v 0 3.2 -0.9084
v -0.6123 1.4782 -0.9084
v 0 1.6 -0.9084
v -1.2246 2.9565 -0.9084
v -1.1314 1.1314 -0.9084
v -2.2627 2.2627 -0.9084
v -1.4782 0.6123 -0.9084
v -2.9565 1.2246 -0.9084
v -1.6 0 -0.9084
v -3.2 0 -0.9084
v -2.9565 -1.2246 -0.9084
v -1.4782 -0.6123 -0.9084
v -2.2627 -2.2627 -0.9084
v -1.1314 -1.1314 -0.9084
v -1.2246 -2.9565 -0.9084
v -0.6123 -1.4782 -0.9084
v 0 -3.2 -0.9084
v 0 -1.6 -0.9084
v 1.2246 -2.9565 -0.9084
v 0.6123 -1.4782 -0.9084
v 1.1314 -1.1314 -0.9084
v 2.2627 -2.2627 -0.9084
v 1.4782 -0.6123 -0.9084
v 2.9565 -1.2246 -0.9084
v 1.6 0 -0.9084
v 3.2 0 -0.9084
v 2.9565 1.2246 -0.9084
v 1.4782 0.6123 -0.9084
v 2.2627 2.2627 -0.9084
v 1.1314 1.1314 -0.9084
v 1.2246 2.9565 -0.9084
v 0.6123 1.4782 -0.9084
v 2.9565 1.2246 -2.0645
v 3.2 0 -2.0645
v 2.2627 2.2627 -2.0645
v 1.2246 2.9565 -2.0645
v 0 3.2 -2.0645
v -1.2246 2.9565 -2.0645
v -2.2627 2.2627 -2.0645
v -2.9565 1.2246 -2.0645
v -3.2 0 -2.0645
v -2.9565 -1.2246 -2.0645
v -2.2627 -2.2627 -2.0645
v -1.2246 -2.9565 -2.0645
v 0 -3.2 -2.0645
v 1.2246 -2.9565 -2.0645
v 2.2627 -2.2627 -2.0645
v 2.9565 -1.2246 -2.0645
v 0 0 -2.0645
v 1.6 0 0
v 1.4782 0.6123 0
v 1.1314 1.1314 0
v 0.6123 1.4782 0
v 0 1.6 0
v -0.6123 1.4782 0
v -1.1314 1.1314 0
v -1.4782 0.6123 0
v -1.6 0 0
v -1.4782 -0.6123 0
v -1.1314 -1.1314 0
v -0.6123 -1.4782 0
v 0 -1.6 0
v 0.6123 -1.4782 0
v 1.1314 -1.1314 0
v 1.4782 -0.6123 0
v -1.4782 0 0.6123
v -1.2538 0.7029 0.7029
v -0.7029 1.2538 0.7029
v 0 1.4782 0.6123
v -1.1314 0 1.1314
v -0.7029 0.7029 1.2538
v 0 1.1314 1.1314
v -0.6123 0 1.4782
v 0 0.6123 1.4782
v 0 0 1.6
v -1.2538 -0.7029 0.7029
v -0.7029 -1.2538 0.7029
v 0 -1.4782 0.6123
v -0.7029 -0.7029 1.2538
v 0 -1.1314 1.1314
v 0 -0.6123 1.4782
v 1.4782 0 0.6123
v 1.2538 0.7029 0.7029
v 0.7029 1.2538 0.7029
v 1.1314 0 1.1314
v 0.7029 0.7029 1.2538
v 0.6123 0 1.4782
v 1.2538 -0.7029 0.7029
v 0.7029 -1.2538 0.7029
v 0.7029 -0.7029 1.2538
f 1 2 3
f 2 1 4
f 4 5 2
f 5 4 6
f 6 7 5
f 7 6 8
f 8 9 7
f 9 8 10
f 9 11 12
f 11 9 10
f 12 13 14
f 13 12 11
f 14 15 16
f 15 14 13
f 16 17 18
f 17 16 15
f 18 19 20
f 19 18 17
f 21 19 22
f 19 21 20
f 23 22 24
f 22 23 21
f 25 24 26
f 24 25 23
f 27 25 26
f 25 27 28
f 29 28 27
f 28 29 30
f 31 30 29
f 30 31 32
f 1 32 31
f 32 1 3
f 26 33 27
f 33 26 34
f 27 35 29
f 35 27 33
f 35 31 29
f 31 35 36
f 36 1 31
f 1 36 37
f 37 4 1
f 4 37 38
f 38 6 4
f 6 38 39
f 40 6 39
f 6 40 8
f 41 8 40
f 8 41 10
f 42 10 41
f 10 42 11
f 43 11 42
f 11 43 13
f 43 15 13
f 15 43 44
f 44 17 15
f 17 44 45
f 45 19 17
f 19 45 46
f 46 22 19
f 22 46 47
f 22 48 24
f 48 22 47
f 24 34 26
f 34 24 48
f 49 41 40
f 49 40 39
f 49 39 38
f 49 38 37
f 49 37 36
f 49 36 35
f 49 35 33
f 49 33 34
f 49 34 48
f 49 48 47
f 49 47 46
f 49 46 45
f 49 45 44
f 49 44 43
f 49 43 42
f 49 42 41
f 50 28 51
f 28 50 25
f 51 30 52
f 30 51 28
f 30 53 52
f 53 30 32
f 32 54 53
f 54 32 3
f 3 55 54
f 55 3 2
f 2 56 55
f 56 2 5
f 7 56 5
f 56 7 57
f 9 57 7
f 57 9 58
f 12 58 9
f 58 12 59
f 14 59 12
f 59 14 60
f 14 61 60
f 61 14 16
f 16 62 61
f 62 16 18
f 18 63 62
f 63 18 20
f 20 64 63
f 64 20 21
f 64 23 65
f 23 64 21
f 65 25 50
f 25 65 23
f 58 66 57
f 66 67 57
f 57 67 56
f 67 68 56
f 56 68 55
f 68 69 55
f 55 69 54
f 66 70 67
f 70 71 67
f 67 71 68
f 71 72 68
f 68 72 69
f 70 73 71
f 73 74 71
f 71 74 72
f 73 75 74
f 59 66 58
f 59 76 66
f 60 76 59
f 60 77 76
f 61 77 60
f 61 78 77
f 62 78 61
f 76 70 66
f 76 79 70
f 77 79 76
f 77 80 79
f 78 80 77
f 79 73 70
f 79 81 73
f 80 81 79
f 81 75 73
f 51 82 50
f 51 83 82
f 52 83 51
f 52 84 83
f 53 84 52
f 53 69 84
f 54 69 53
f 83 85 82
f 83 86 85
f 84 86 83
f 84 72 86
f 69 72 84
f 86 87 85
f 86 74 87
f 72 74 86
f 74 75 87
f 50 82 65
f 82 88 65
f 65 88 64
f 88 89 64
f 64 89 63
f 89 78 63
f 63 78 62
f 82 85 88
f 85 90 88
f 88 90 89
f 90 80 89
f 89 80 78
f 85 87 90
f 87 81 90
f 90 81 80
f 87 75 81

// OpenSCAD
// file: ../p/stud3.scad
use <../lib.scad>
use <4-4cyli.scad>
use <4-4disc.scad>
use <4-4edge.scad>
$fa=1; $fs=0.2;
function ldraw_lib__stud3(realsolid=false) = realsolid ? 
    [openscad(translate([0,0,-eps()], o=cylinder(4+eps(), r=4)),2)] : [
// 0 Stud Tube Solid
// 0 Name: stud3.dat
// 0 Author: James Jessiman
// 0 !LDRAW_ORG Primitive UPDATE 2012-01
// 0 !LICENSE Licensed under CC BY 2.0 and CC BY 4.0 : see CAreadme.txt
// 
// 0 BFC CERTIFY CCW
  [0,"BFC","CERTIFY"],
  [0,"BFC","CCW"],
// 
// 0 !HISTORY 2002-04-04 [sbliss] Modified for BFC compliance
// 0 !HISTORY 2002-04-25 [PTadmin] Official Update 2002-02
// 0 !HISTORY 2007-06-24 [PTadmin] Header formatted for Contributor Agreement
// 0 !HISTORY 2008-07-01 [PTadmin] Official Update 2008-01
// 0 !HISTORY 2012-02-16 [Philo] Changed to CCW
// 0 !HISTORY 2012-03-30 [PTadmin] Official Update 2012-01
// 
// 
// 1 16 0 -4 0 4 0 0 0 1 0 0 0 4 4-4edge.dat
  [1,16,0,-4,0,4,0,0,0,1,0,0,0,4, ldraw_lib__4_4edge(realsolid)],
// 1 16 0 0 0 4 0 0 0 1 0 0 0 4 4-4edge.dat
  [1,16,0,0,0,4,0,0,0,1,0,0,0,4, ldraw_lib__4_4edge(realsolid)],
// 1 16 0 -4 0 4 0 0 0 1 0 0 0 4 4-4disc.dat
  [1,16,0,-4,0,4,0,0,0,1,0,0,0,4, ldraw_lib__4_4disc(realsolid)],
// 1 16 0 -4 0 4 0 0 0 4 0 0 0 4 4-4cyli.dat
  [1,16,0,-4,0,4,0,0,0,4,0,0,0,4, ldraw_lib__4_4cyli(realsolid)],
];
module ldraw_lib__stud3(step=0, col=false, unit=2/5, alt=false, line=0.2, solid=!$preview)
    makepoly(ldraw_lib__stud3(solid), step=step, col=col, unit=unit, alt=alt, line=line, solid=solid);
ldraw_lib__stud3(line=0.2);
// file: ../p/stud.scad
use <../lib.scad>
use <4-4cyli.scad>
use <4-4disc.scad>
use <4-4edge.scad>
$fa=1; $fs=0.2;
function ldraw_lib__stud(realsolid=false) = realsolid ? 
    [openscad(translate([0,0,-eps()], o=cylinder(4+eps(), r=6)),2)] : [
// 0 Stud
// 0 Name: stud.dat
// 0 Author: James Jessiman
// 0 !LDRAW_ORG Primitive UPDATE 2012-01
// 0 !LICENSE Licensed under CC BY 2.0 and CC BY 4.0 : see CAreadme.txt
// 
// 0 BFC CERTIFY CCW
  [0,"BFC","CERTIFY"],
  [0,"BFC","CCW"],
// 
// 0 !HISTORY 2002-04-04 [sbliss] Modified for BFC compliance
// 0 !HISTORY 2002-04-25 [PTadmin] Official Update 2002-02
// 0 !HISTORY 2007-06-24 [PTadmin] Header formatted for Contributor Agreement
// 0 !HISTORY 2008-07-01 [PTadmin] Official Update 2008-01
// 0 !HISTORY 2012-02-16 [Philo] Changed to CCW
// 0 !HISTORY 2012-03-30 [PTadmin] Official Update 2012-01
// 
// 
// 1 16 0 0 0 6 0 0 0 1 0 0 0 6 4-4edge.dat
  [1,16,0,0,0,6,0,0,0,1,0,0,0,6, ldraw_lib__4_4edge(realsolid)],
// 1 16 0 -4 0 6 0 0 0 1 0 0 0 6 4-4edge.dat
  [1,16,0,-4,0,6,0,0,0,1,0,0,0,6, ldraw_lib__4_4edge(realsolid)],
// 1 16 0 0 0 6 0 0 0 -4 0 0 0 6 4-4cyli.dat
  [1,16,0,0,0,6,0,0,0,-4,0,0,0,6, ldraw_lib__4_4cyli(realsolid)],
// 1 16 0 -4 0 6 0 0 0 1 0 0 0 6 4-4disc.dat
  [1,16,0,-4,0,6,0,0,0,1,0,0,0,6, ldraw_lib__4_4disc(realsolid)],
];
module ldraw_lib__stud(step=0, col=false, unit=2/5, alt=false, line=0.2, solid=!$preview)
    makepoly(ldraw_lib__stud(solid), step=step, col=col, unit=unit, alt=alt, line=line, solid=solid);
ldraw_lib__stud(line=0.2);
// file: ../p/box5.scad
use <../lib.scad>
$fa=1; $fs=0.2;
function ldraw_lib__box5(realsolid=false) = [
// 0 Box with 5 Faces and All Edges
// 0 Name: box5.dat
// 0 Author: James Jessiman
// 0 !LDRAW_ORG Primitive UPDATE 2012-01
// 0 !LICENSE Licensed under CC BY 2.0 and CC BY 4.0 : see CAreadme.txt
// 
// 0 BFC CERTIFY CCW
  [0,"BFC","CERTIFY"],
  [0,"BFC","CCW"],
// 
// 0 !HISTORY 2002-04-03 [sbliss] Modified for BFC compliance
// 0 !HISTORY 2002-04-25 [PTadmin] Official Update 2002-02
// 0 !HISTORY 2007-06-24 [PTadmin] Header formatted for Contributor Agreement
// 0 !HISTORY 2008-07-01 [PTadmin] Official Update 2008-01
// 0 !HISTORY 2012-02-16 [Philo] Changed to CCW
// 0 !HISTORY 2012-03-30 [PTadmin] Official Update 2012-01
// 
// 
// 2 24 1 1 1 -1 1 1
  [2,24,1,1,1,-1,1,1],
// 2 24 -1 1 1 -1 1 -1
  [2,24,-1,1,1,-1,1,-1],
// 2 24 -1 1 -1 1 1 -1
  [2,24,-1,1,-1,1,1,-1],
// 2 24 1 1 -1 1 1 1
  [2,24,1,1,-1,1,1,1],
// 2 24 1 0 1 -1 0 1
  [2,24,1,0,1,-1,0,1],
// 2 24 -1 0 1 -1 0 -1
  [2,24,-1,0,1,-1,0,-1],
// 2 24 -1 0 -1 1 0 -1
  [2,24,-1,0,-1,1,0,-1],
// 2 24 1 0 -1 1 0 1
  [2,24,1,0,-1,1,0,1],
// 2 24 1 0 1 1 1 1
  [2,24,1,0,1,1,1,1],
// 2 24 -1 0 1 -1 1 1
  [2,24,-1,0,1,-1,1,1],
// 2 24 1 0 -1 1 1 -1
  [2,24,1,0,-1,1,1,-1],
// 2 24 -1 0 -1 -1 1 -1
  [2,24,-1,0,-1,-1,1,-1],
// 4 16 -1 1 1 1 1 1 1 1 -1 -1 1 -1
  [4,16,-1,1,1,1,1,1,1,1,-1,-1,1,-1],
// 4 16 -1 1 1 -1 0 1 1 0 1 1 1 1
  [4,16,-1,1,1,-1,0,1,1,0,1,1,1,1],
// 4 16 -1 1 -1 -1 0 -1 -1 0 1 -1 1 1
  [4,16,-1,1,-1,-1,0,-1,-1,0,1,-1,1,1],
// 4 16 1 1 -1 1 0 -1 -1 0 -1 -1 1 -1
  [4,16,1,1,-1,1,0,-1,-1,0,-1,-1,1,-1],
// 4 16 1 1 1 1 0 1 1 0 -1 1 1 -1
  [4,16,1,1,1,1,0,1,1,0,-1,1,1,-1],
];
module ldraw_lib__box5(step=0, col=false, unit=2/5, alt=false, line=0.2, solid=!$preview)
    makepoly(ldraw_lib__box5(solid), step=step, col=col, unit=unit, alt=alt, line=line, solid=solid);
ldraw_lib__box5(line=0.2);
// file: ../p/box4t.scad
use <../lib.scad>
$fa=1; $fs=0.2;
function ldraw_lib__box4t(realsolid=false) = [
// 0 Box with 4 Adjacent Faces and All Edges
// 0 Name: box4t.dat
// 0 Author: Tore Eriksson [Tore_Eriksson]
// 0 !LDRAW_ORG Primitive UPDATE 2003-02
// 0 !LICENSE Licensed under CC BY 2.0 and CC BY 4.0 : see CAreadme.txt
// 
// 0 BFC CERTIFY CCW
  [0,"BFC","CERTIFY"],
  [0,"BFC","CCW"],
// 
// 0 !HISTORY 1997-09-29 [PTadmin] Official Update 1997-15
// 0 !HISTORY 2002-08-31 [izanette] Modified with WINDZ for BFC compliance
// 0 !HISTORY 2003-08-01 [PTadmin] Official Update 2003-02
// 0 !HISTORY 2007-06-24 [PTadmin] Header formatted for Contributor Agreement
// 0 !HISTORY 2008-07-01 [PTadmin] Official Update 2008-01
// 
// 
// 2 24 1 1 1 -1 1 1
  [2,24,1,1,1,-1,1,1],
// 2 24 -1 1 1 -1 1 -1
  [2,24,-1,1,1,-1,1,-1],
// 2 24 -1 1 -1 1 1 -1
  [2,24,-1,1,-1,1,1,-1],
// 2 24 1 1 -1 1 1 1
  [2,24,1,1,-1,1,1,1],
// 2 24 1 0 1 -1 0 1
  [2,24,1,0,1,-1,0,1],
// 2 24 -1 0 1 -1 0 -1
  [2,24,-1,0,1,-1,0,-1],
// 2 24 -1 0 -1 1 0 -1
  [2,24,-1,0,-1,1,0,-1],
// 2 24 1 0 -1 1 0 1
  [2,24,1,0,-1,1,0,1],
// 2 24 1 0 1 1 1 1
  [2,24,1,0,1,1,1,1],
// 2 24 -1 0 1 -1 1 1
  [2,24,-1,0,1,-1,1,1],
// 2 24 1 0 -1 1 1 -1
  [2,24,1,0,-1,1,1,-1],
// 2 24 -1 0 -1 -1 1 -1
  [2,24,-1,0,-1,-1,1,-1],
// 4 16 1 1 1 1 1 -1 -1 1 -1 -1 1 1
  [4,16,1,1,1,1,1,-1,-1,1,-1,-1,1,1],
// 4 16 1 1 1 -1 1 1 -1 0 1 1 0 1
  [4,16,1,1,1,-1,1,1,-1,0,1,1,0,1],
// 4 16 -1 1 1 -1 1 -1 -1 0 -1 -1 0 1
  [4,16,-1,1,1,-1,1,-1,-1,0,-1,-1,0,1],
// 0 4 16 -1 1 -1 -1 0 -1 1 0 -1 1 1 -1
// 4 16 1 1 -1 1 1 1 1 0 1 1 0 -1
  [4,16,1,1,-1,1,1,1,1,0,1,1,0,-1],
// 0
];
module ldraw_lib__box4t(step=0, col=false, unit=2/5, alt=false, line=0.2, solid=!$preview)
    makepoly(ldraw_lib__box4t(solid), step=step, col=col, unit=unit, alt=alt, line=line, solid=solid);
ldraw_lib__box4t(line=0.2);
// file: ../p/1-8sphe.scad
use <../lib.scad>
$fa=1; $fs=0.2;
function ldraw_lib__1_8sphe(realsolid=false) = [
// 0 Sphere 0.125
// 0 Name: 1-8sphe.dat
// 0 Author: James Jessiman
// 0 !LDRAW_ORG Primitive UPDATE 2012-03
// 0 !LICENSE Licensed under CC BY 2.0 and CC BY 4.0 : see CAreadme.txt
// 
// 0 BFC CERTIFY CCW
  [0,"BFC","CERTIFY"],
  [0,"BFC","CCW"],
// 
// 0 !HISTORY 2000-08-01 {Axel Poque} fixes to resolve L3P error messages.
// 0 !HISTORY 2000-08-01 {Manfred Moolhuysen} fixes to resolve L3P error messages.
// 0 !HISTORY 2000-09-30 [PTadmin] Official Update 2000-02
// 0 !HISTORY 2002-03-28 [hafhead] Made BFC compliant
// 0 !HISTORY 2002-04-25 [PTadmin] Official Update 2002-02
// 0 !HISTORY 2007-06-22 [PTadmin] Header formatted for Contributor Agreement
// 0 !HISTORY 2008-07-01 [PTadmin] Official Update 2008-01
// 0 !HISTORY 2010-09-12 [MagFors] Changed winding, removed duplicated cond-line, optimized filesize
// 0 !HISTORY 2010-12-31 [PTadmin] Official Update 2010-03
// 0 !HISTORY 2012-07-01 [tcobbs] Replaced with geometry from LDView
// 0 !HISTORY 2012-12-28 [PTadmin] Official Update 2012-03
// 
// 
// 3 16 1 0 0 0.9239 0.3827 0 0.9239 0 0.3827
  [3,16,1,0,0,0.9239,0.3827,0,0.9239,0,0.3827],
// 3 16 0.9239 0.3827 0 0.7836 0.4393 0.4393 0.9239 0 0.3827
  [3,16,0.9239,0.3827,0,0.7836,0.4393,0.4393,0.9239,0,0.3827],
// 3 16 0.9239 0 0.3827 0.7836 0.4393 0.4393 0.7071 0 0.7071
  [3,16,0.9239,0,0.3827,0.7836,0.4393,0.4393,0.7071,0,0.7071],
// 3 16 0.7836 0.4393 0.4393 0.4393 0.4393 0.7836 0.7071 0 0.7071
  [3,16,0.7836,0.4393,0.4393,0.4393,0.4393,0.7836,0.7071,0,0.7071],
// 3 16 0.7071 0 0.7071 0.4393 0.4393 0.7836 0.3827 0 0.9239
  [3,16,0.7071,0,0.7071,0.4393,0.4393,0.7836,0.3827,0,0.9239],
// 3 16 0.4393 0.4393 0.7836 0 0.3827 0.9239 0.3827 0 0.9239
  [3,16,0.4393,0.4393,0.7836,0,0.3827,0.9239,0.3827,0,0.9239],
// 3 16 0.3827 0 0.9239 0 0.3827 0.9239 0 0 1
  [3,16,0.3827,0,0.9239,0,0.3827,0.9239,0,0,1],
// 3 16 0.9239 0.3827 0 0.7071 0.7071 0 0.7836 0.4393 0.4393
  [3,16,0.9239,0.3827,0,0.7071,0.7071,0,0.7836,0.4393,0.4393],
// 3 16 0.7071 0.7071 0 0.4393 0.7836 0.4393 0.7836 0.4393 0.4393
  [3,16,0.7071,0.7071,0,0.4393,0.7836,0.4393,0.7836,0.4393,0.4393],
// 3 16 0.7836 0.4393 0.4393 0.4393 0.7836 0.4393 0.4393 0.4393 0.7836
  [3,16,0.7836,0.4393,0.4393,0.4393,0.7836,0.4393,0.4393,0.4393,0.7836],
// 3 16 0.4393 0.7836 0.4393 0 0.7071 0.7071 0.4393 0.4393 0.7836
  [3,16,0.4393,0.7836,0.4393,0,0.7071,0.7071,0.4393,0.4393,0.7836],
// 3 16 0.4393 0.4393 0.7836 0 0.7071 0.7071 0 0.3827 0.9239
  [3,16,0.4393,0.4393,0.7836,0,0.7071,0.7071,0,0.3827,0.9239],
// 3 16 0.7071 0.7071 0 0.3827 0.9239 0 0.4393 0.7836 0.4393
  [3,16,0.7071,0.7071,0,0.3827,0.9239,0,0.4393,0.7836,0.4393],
// 3 16 0.3827 0.9239 0 0 0.9239 0.3827 0.4393 0.7836 0.4393
  [3,16,0.3827,0.9239,0,0,0.9239,0.3827,0.4393,0.7836,0.4393],
// 3 16 0.4393 0.7836 0.4393 0 0.9239 0.3827 0 0.7071 0.7071
  [3,16,0.4393,0.7836,0.4393,0,0.9239,0.3827,0,0.7071,0.7071],
// 3 16 0.3827 0.9239 0 0 1 0 0 0.9239 0.3827
  [3,16,0.3827,0.9239,0,0,1,0,0,0.9239,0.3827],
// 
// 5 24 1 0 0 0.9239 0.3827 0 1 0 -0.1 0.9239 0 0.3827
  [5,24,1,0,0,0.9239,0.3827,0,1,0,-0.1,0.9239,0,0.3827],
// 5 24 0.9239 0.3827 0 0.9239 0 0.3827 1 0 0 0.7836 0.4393 0.4393
  [5,24,0.9239,0.3827,0,0.9239,0,0.3827,1,0,0,0.7836,0.4393,0.4393],
// 5 24 1 0 0 0.9239 0 0.3827 0.9239 0.3827 0 1 -0.1 0
  [5,24,1,0,0,0.9239,0,0.3827,0.9239,0.3827,0,1,-0.1,0],
// 5 24 0.9239 0 0.3827 0.7836 0.4393 0.4393 0.9239 0.3827 0 0.7071 0 0.7071
  [5,24,0.9239,0,0.3827,0.7836,0.4393,0.4393,0.9239,0.3827,0,0.7071,0,0.7071],
// 5 24 0.7836 0.4393 0.4393 0.7071 0 0.7071 0.9239 0 0.3827 0.4393 0.4393 0.7836
  [5,24,0.7836,0.4393,0.4393,0.7071,0,0.7071,0.9239,0,0.3827,0.4393,0.4393,0.7836],
// 5 24 0.9239 0 0.3827 0.7071 0 0.7071 0.7836 0.4393 0.4393 0.9239 -0.1 0.3827
  [5,24,0.9239,0,0.3827,0.7071,0,0.7071,0.7836,0.4393,0.4393,0.9239,-0.1,0.3827],
// 5 24 0.7071 0 0.7071 0.4393 0.4393 0.7836 0.7836 0.4393 0.4393 0.3827 0 0.9239
  [5,24,0.7071,0,0.7071,0.4393,0.4393,0.7836,0.7836,0.4393,0.4393,0.3827,0,0.9239],
// 5 24 0.4393 0.4393 0.7836 0.3827 0 0.9239 0.7071 0 0.7071 0 0.3827 0.9239
  [5,24,0.4393,0.4393,0.7836,0.3827,0,0.9239,0.7071,0,0.7071,0,0.3827,0.9239],
// 5 24 0.7071 0 0.7071 0.3827 0 0.9239 0.4393 0.4393 0.7836 0.7071 -0.1 0.7071
  [5,24,0.7071,0,0.7071,0.3827,0,0.9239,0.4393,0.4393,0.7836,0.7071,-0.1,0.7071],
// 5 24 0.3827 0 0.9239 0 0.3827 0.9239 0.4393 0.4393 0.7836 0 0 1
  [5,24,0.3827,0,0.9239,0,0.3827,0.9239,0.4393,0.4393,0.7836,0,0,1],
// 5 24 0 0.3827 0.9239 0 0 1 0.3827 0 0.9239 -0.1 0.3827 0.9239
  [5,24,0,0.3827,0.9239,0,0,1,0.3827,0,0.9239,-0.1,0.3827,0.9239],
// 5 24 0.3827 0 0.9239 0 0 1 0 0.3827 0.9239 0.3827 -0.1 0.9239
  [5,24,0.3827,0,0.9239,0,0,1,0,0.3827,0.9239,0.3827,-0.1,0.9239],
// 5 24 0.9239 0.3827 0 0.7071 0.7071 0 0.9239 0.3827 -0.1 0.7836 0.4393 0.4393
  [5,24,0.9239,0.3827,0,0.7071,0.7071,0,0.9239,0.3827,-0.1,0.7836,0.4393,0.4393],
// 5 24 0.7071 0.7071 0 0.7836 0.4393 0.4393 0.9239 0.3827 0 0.4393 0.7836 0.4393
  [5,24,0.7071,0.7071,0,0.7836,0.4393,0.4393,0.9239,0.3827,0,0.4393,0.7836,0.4393],
// 5 24 0.9239 0.3827 0 0.7836 0.4393 0.4393 0.7071 0.7071 0 0.9239 0 0.3827
  [5,24,0.9239,0.3827,0,0.7836,0.4393,0.4393,0.7071,0.7071,0,0.9239,0,0.3827],
// 5 24 0.7836 0.4393 0.4393 0.4393 0.7836 0.4393 0.7071 0.7071 0 0.4393 0.4393 0.7836
  [5,24,0.7836,0.4393,0.4393,0.4393,0.7836,0.4393,0.7071,0.7071,0,0.4393,0.4393,0.7836],
// 5 24 0.4393 0.7836 0.4393 0.4393 0.4393 0.7836 0.7836 0.4393 0.4393 0 0.7071 0.7071
  [5,24,0.4393,0.7836,0.4393,0.4393,0.4393,0.7836,0.7836,0.4393,0.4393,0,0.7071,0.7071],
// 5 24 0.7836 0.4393 0.4393 0.4393 0.4393 0.7836 0.4393 0.7836 0.4393 0.7071 0 0.7071
  [5,24,0.7836,0.4393,0.4393,0.4393,0.4393,0.7836,0.4393,0.7836,0.4393,0.7071,0,0.7071],
// 5 24 0.4393 0.4393 0.7836 0 0.7071 0.7071 0.4393 0.7836 0.4393 0 0.3827 0.9239
  [5,24,0.4393,0.4393,0.7836,0,0.7071,0.7071,0.4393,0.7836,0.4393,0,0.3827,0.9239],
// 5 24 0 0.7071 0.7071 0 0.3827 0.9239 0.4393 0.4393 0.7836 -0.1 0.7071 0.7071
  [5,24,0,0.7071,0.7071,0,0.3827,0.9239,0.4393,0.4393,0.7836,-0.1,0.7071,0.7071],
// 5 24 0.4393 0.4393 0.7836 0 0.3827 0.9239 0 0.7071 0.7071 0.3827 0 0.9239
  [5,24,0.4393,0.4393,0.7836,0,0.3827,0.9239,0,0.7071,0.7071,0.3827,0,0.9239],
// 5 24 0.7071 0.7071 0 0.3827 0.9239 0 0.7071 0.7071 -0.1 0.4393 0.7836 0.4393
  [5,24,0.7071,0.7071,0,0.3827,0.9239,0,0.7071,0.7071,-0.1,0.4393,0.7836,0.4393],
// 5 24 0.3827 0.9239 0 0.4393 0.7836 0.4393 0.7071 0.7071 0 0 0.9239 0.3827
  [5,24,0.3827,0.9239,0,0.4393,0.7836,0.4393,0.7071,0.7071,0,0,0.9239,0.3827],
// 5 24 0.7071 0.7071 0 0.4393 0.7836 0.4393 0.3827 0.9239 0 0.7836 0.4393 0.4393
  [5,24,0.7071,0.7071,0,0.4393,0.7836,0.4393,0.3827,0.9239,0,0.7836,0.4393,0.4393],
// 5 24 0.4393 0.7836 0.4393 0 0.9239 0.3827 0.3827 0.9239 0 0 0.7071 0.7071
  [5,24,0.4393,0.7836,0.4393,0,0.9239,0.3827,0.3827,0.9239,0,0,0.7071,0.7071],
// 5 24 0 0.9239 0.3827 0 0.7071 0.7071 0.4393 0.7836 0.4393 -0.1 0.9239 0.3827
  [5,24,0,0.9239,0.3827,0,0.7071,0.7071,0.4393,0.7836,0.4393,-0.1,0.9239,0.3827],
// 5 24 0.4393 0.7836 0.4393 0 0.7071 0.7071 0 0.9239 0.3827 0.4393 0.4393 0.7836
  [5,24,0.4393,0.7836,0.4393,0,0.7071,0.7071,0,0.9239,0.3827,0.4393,0.4393,0.7836],
// 5 24 0.3827 0.9239 0 0 1 0 0.3827 0.9239 -0.1 0 0.9239 0.3827
  [5,24,0.3827,0.9239,0,0,1,0,0.3827,0.9239,-0.1,0,0.9239,0.3827],
// 5 24 0 1 0 0 0.9239 0.3827 0.3827 0.9239 0 -0.1 1 0
  [5,24,0,1,0,0,0.9239,0.3827,0.3827,0.9239,0,-0.1,1,0],
// 5 24 0.3827 0.9239 0 0 0.9239 0.3827 0 1 0 0.4393 0.7836 0.4393
  [5,24,0.3827,0.9239,0,0,0.9239,0.3827,0,1,0,0.4393,0.7836,0.4393],
];
module ldraw_lib__1_8sphe(step=0, col=false, unit=2/5, alt=false, line=0.2, solid=!$preview)
    makepoly(ldraw_lib__1_8sphe(solid), step=step, col=col, unit=unit, alt=alt, line=line, solid=solid);
ldraw_lib__1_8sphe(line=0.2);
// file: s/3004s01.scad
use <../../lib.scad>
use <../../p/box4t.scad>
use <../../p/box5.scad>
use <../../p/stud.scad>
use <../../p/stud3.scad>
$fa=1; $fs=0.2;
function ldraw_lib__s__3004s01(realsolid=false) = [
// 0 ~Brick  1 x  2 without Front Face
// 0 Name: s\3004s01.dat
// 0 Author: James Jessiman
// 0 !LDRAW_ORG Subpart UPDATE 2003-03
// 0 !LICENSE Licensed under CC BY 2.0 and CC BY 4.0 : see CAreadme.txt
// 
// 0 BFC CERTIFY CCW
  [0,"BFC","CERTIFY"],
  [0,"BFC","CCW"],
// 
// 0 !HISTORY 2003-09-07 [jriley] Subfiling, BFC
// 0 !HISTORY 2003-12-19 [PTadmin] Official Update 2003-03
// 0 !HISTORY 2007-08-29 [PTadmin] Header formatted for Contributor Agreement
// 0 !HISTORY 2008-07-01 [PTadmin] Official Update 2008-01
// 
// 
// 1 16 0 4 0 1 0 0 0 -5 0 0 0 1 stud3.dat
  [1,16,0,4,0,1,0,0,0,-5,0,0,0,1, ldraw_lib__stud3(realsolid)],
// 0 BFC INVERTNEXT
  [0,"BFC","INVERTNEXT"],
// 1 16 0 24 0 16 0 0 0 -20 0 0 0 6 box5.dat
  [1,16,0,24,0,16,0,0,0,-20,0,0,0,6, ldraw_lib__box5(realsolid)],
// 4 16 20 24 10 16 24 6 -16 24 6 -20 24 10
  [4,16,20,24,10,16,24,6,-16,24,6,-20,24,10],
// 4 16 -20 24 10 -16 24 6 -16 24 -6 -20 24 -10
  [4,16,-20,24,10,-16,24,6,-16,24,-6,-20,24,-10],
// 4 16 -20 24 -10 -16 24 -6 16 24 -6 20 24 -10
  [4,16,-20,24,-10,-16,24,-6,16,24,-6,20,24,-10],
// 4 16 20 24 -10 16 24 -6 16 24 6 20 24 10
  [4,16,20,24,-10,16,24,-6,16,24,6,20,24,10],
// 1 16 0 24 0 20 0 0 0 -24 0 0 0 10 box4t.dat
  [1,16,0,24,0,20,0,0,0,-24,0,0,0,10, ldraw_lib__box4t(realsolid)],
// 1 16 10 0 0 1 0 0 0 1 0 0 0 1 stud.dat
  [1,16,10,0,0,1,0,0,0,1,0,0,0,1, ldraw_lib__stud(realsolid)],
// 1 16 -10 0 0 1 0 0 0 1 0 0 0 1 stud.dat
  [1,16,-10,0,0,1,0,0,0,1,0,0,0,1, ldraw_lib__stud(realsolid)],
// 0
];
module ldraw_lib__s__3004s01(step=0, col=false, unit=2/5, alt=false, line=0.2, solid=!$preview)
    makepoly(ldraw_lib__s__3004s01(solid), step=step, col=col, unit=unit, alt=alt, line=line, solid=solid);
ldraw_lib__s__3004s01(line=0.2);
// file: ../p/4-8sphe.scad
use <../lib.scad>
use <1-8sphe.scad>
$fa=1; $fs=0.2;
function ldraw_lib__4_8sphe(realsolid=false) = [
// 0 Sphere 0.5
// 0 Name: 4-8sphe.dat
// 0 Author: James Jessiman
// 0 !LDRAW_ORG Primitive UPDATE 2003-02
// 0 !LICENSE Licensed under CC BY 2.0 and CC BY 4.0 : see CAreadme.txt
// 
// 0 BFC CERTIFY CCW
  [0,"BFC","CERTIFY"],
  [0,"BFC","CCW"],
// 
// 0 !HISTORY 2002-08-31 [izanette] Modified with WINDZ for BFC compliance
// 0 !HISTORY 2003-08-01 [PTadmin] Official Update 2003-02
// 0 !HISTORY 2007-06-24 [PTadmin] Header formatted for Contributor Agreement
// 0 !HISTORY 2008-07-01 [PTadmin] Official Update 2008-01
// 
// 
// 1 16 0 0 0 1 0 0 0 1 0 0 0 1 1-8sphe.dat
  [1,16,0,0,0,1,0,0,0,1,0,0,0,1, ldraw_lib__1_8sphe(realsolid)],
// 1 16 0 0 0 1 0 0 0 1 0 0 0 -1 1-8sphe.dat
  [1,16,0,0,0,1,0,0,0,1,0,0,0,-1, ldraw_lib__1_8sphe(realsolid)],
// 1 16 0 0 0 -1 0 0 0 1 0 0 0 1 1-8sphe.dat
  [1,16,0,0,0,-1,0,0,0,1,0,0,0,1, ldraw_lib__1_8sphe(realsolid)],
// 1 16 0 0 0 -1 0 0 0 1 0 0 0 -1 1-8sphe.dat
  [1,16,0,0,0,-1,0,0,0,1,0,0,0,-1, ldraw_lib__1_8sphe(realsolid)],
// 0
// 
];
module ldraw_lib__4_8sphe(step=0, col=false, unit=2/5, alt=false, line=0.2, solid=!$preview)
    makepoly(ldraw_lib__4_8sphe(solid), step=step, col=col, unit=unit, alt=alt, line=line, solid=solid);
ldraw_lib__4_8sphe(line=0.2);
// file: ../p/4-4ring1.scad
use <../lib.scad>
$fa=1; $fs=0.2;
function ldraw_lib__4_4ring1(realsolid=false) = [
// 0 Ring  1 x 1.0
// 0 Name: 4-4ring1.dat
// 0 Author: James Jessiman
// 0 !LDRAW_ORG Primitive UPDATE 2009-01
// 0 !LICENSE Licensed under CC BY 2.0 and CC BY 4.0 : see CAreadme.txt
// 
// 0 BFC CERTIFY CCW
  [0,"BFC","CERTIFY"],
  [0,"BFC","CCW"],
// 
// 0 !HISTORY 1998-12-15 [PTadmin] Official Update 1998-10
// 0 !HISTORY 2002-04-08 [BrickCaster] Modified for BFC compliance
// 0 !HISTORY 2002-04-25 [PTadmin] Official Update 2002-02
// 0 !HISTORY 2007-06-24 [PTadmin] Header formatted for Contributor Agreement
// 0 !HISTORY 2008-07-01 [PTadmin] Official Update 2008-01
// 0 !HISTORY 2008-08-26 [cwdee] Switch polygon winding and rename
// 0 !HISTORY 2009-05-02 [PTadmin] Official Update 2009-01
// 
// 
// 4 16 -0.7654 0 1.8478 -0.3827 0 0.9239 0 0 1 0 0 2
  [4,16,-0.7654,0,1.8478,-0.3827,0,0.9239,0,0,1,0,0,2],
// 4 16 -1.4142 0 1.4142 -0.7071 0 0.7071 -0.3827 0 0.9239 -0.7654 0 1.8478
  [4,16,-1.4142,0,1.4142,-0.7071,0,0.7071,-0.3827,0,0.9239,-0.7654,0,1.8478],
// 4 16 -1.8478 0 0.7654 -0.9239 0 0.3827 -0.7071 0 0.7071 -1.4142 0 1.41420
  [4,16,-1.8478,0,0.7654,-0.9239,0,0.3827,-0.7071,0,0.7071,-1.4142,0,1.41420],
// 4 16 -2 0 0 -1 0 0 -0.9239 0 0.3827 -1.8478 0 0.7654
  [4,16,-2,0,0,-1,0,0,-0.9239,0,0.3827,-1.8478,0,0.7654],
// 4 16 -1.8478 0 -0.7654 -0.9239 0 -0.3827 -1 0 0 -2 0 0
  [4,16,-1.8478,0,-0.7654,-0.9239,0,-0.3827,-1,0,0,-2,0,0],
// 4 16 -1.4142 0 -1.4142 -0.7071 0 -0.7071 -0.9239 0 -0.3827 -1.8478 0 -0.7654
  [4,16,-1.4142,0,-1.4142,-0.7071,0,-0.7071,-0.9239,0,-0.3827,-1.8478,0,-0.7654],
// 4 16 -0.7654 0 -1.8478 -0.3827 0 -0.9239 -0.7071 0 -0.7071 -1.4142 0 -1.4142
  [4,16,-0.7654,0,-1.8478,-0.3827,0,-0.9239,-0.7071,0,-0.7071,-1.4142,0,-1.4142],
// 4 16 0 0 -2 0 0 -1 -0.3827 0 -0.9239 -0.7654 0 -1.8478
  [4,16,0,0,-2,0,0,-1,-0.3827,0,-0.9239,-0.7654,0,-1.8478],
// 4 16 0.7654 0 -1.8478 0.3827 0 -0.9239 0 0 -1 0 0 -2
  [4,16,0.7654,0,-1.8478,0.3827,0,-0.9239,0,0,-1,0,0,-2],
// 4 16 1.4142 0 -1.4142 0.7071 0 -0.7071 0.3827 0 -0.9239 0.7654 0 -1.8478
  [4,16,1.4142,0,-1.4142,0.7071,0,-0.7071,0.3827,0,-0.9239,0.7654,0,-1.8478],
// 4 16 1.8478 0 -0.7654 0.9239 0 -0.3827 0.7071 0 -0.7071 1.4142 0 -1.4142
  [4,16,1.8478,0,-0.7654,0.9239,0,-0.3827,0.7071,0,-0.7071,1.4142,0,-1.4142],
// 4 16 2 0 0 1 0 0 0.9239 0 -0.3827 1.8478 0 -0.7654
  [4,16,2,0,0,1,0,0,0.9239,0,-0.3827,1.8478,0,-0.7654],
// 4 16 1.8478 0 0.7654 0.9239 0 0.3827 1 0 0 2 0 0
  [4,16,1.8478,0,0.7654,0.9239,0,0.3827,1,0,0,2,0,0],
// 4 16 1.4142 0 1.4142 0.7071 0 0.7071 0.9239 0 0.3827 1.8478 0 0.7654
  [4,16,1.4142,0,1.4142,0.7071,0,0.7071,0.9239,0,0.3827,1.8478,0,0.7654],
// 4 16 0.7654 0 1.8478 0.3827 0 0.9239 0.7071 0 0.7071 1.4142 0 1.4142
  [4,16,0.7654,0,1.8478,0.3827,0,0.9239,0.7071,0,0.7071,1.4142,0,1.4142],
// 4 16 0 0 2 0 0 1 0.3827 0 0.9239 0.7654 0 1.8478
  [4,16,0,0,2,0,0,1,0.3827,0,0.9239,0.7654,0,1.8478],
// 0
];
module ldraw_lib__4_4ring1(step=0, col=false, unit=2/5, alt=false, line=0.2, solid=!$preview)
    makepoly(ldraw_lib__4_4ring1(solid), step=step, col=col, unit=unit, alt=alt, line=line, solid=solid);
ldraw_lib__4_4ring1(line=0.2);
// file: ../p/4-4edge.scad
use <../lib.scad>
$fa=1; $fs=0.2;
function ldraw_lib__4_4edge(realsolid=false) = [
// 0 Circle 1.0
// 0 Name: 4-4edge.dat
// 0 Author: James Jessiman
// 0 !LDRAW_ORG Primitive UPDATE 2017-01
// 0 !LICENSE Licensed under CC BY 2.0 and CC BY 4.0 : see CAreadme.txt
// 
// 0 BFC CERTIFY CCW
  [0,"BFC","CERTIFY"],
  [0,"BFC","CCW"],
// 
// 0 !HISTORY 1998-12-15 [PTadmin] Official Update 1998-10
// 0 !HISTORY 2005-12-28 [PTadmin] Official Update 2005-01
// 0 !HISTORY 2007-06-24 [PTadmin] Header formatted for Contributor Agreement
// 0 !HISTORY 2008-07-01 [PTadmin] Official Update 2008-01
// 0 !HISTORY 2017-01-15 [Steffen] BFCed
// 0 !HISTORY 2017-12-30 [PTadmin] Official Update 2017-01
// 
// 
// 2 24 1 0 0 0.9239 0 0.3827
  [2,24,1,0,0,0.9239,0,0.3827],
// 2 24 0.9239 0 0.3827 0.7071 0 0.7071
  [2,24,0.9239,0,0.3827,0.7071,0,0.7071],
// 2 24 0.7071 0 0.7071 0.3827 0 0.9239
  [2,24,0.7071,0,0.7071,0.3827,0,0.9239],
// 2 24 0.3827 0 0.9239 0 0 1
  [2,24,0.3827,0,0.9239,0,0,1],
// 2 24 0 0 1 -0.3827 0 0.9239
  [2,24,0,0,1,-0.3827,0,0.9239],
// 2 24 -0.3827 0 0.9239 -0.7071 0 0.7071
  [2,24,-0.3827,0,0.9239,-0.7071,0,0.7071],
// 2 24 -0.7071 0 0.7071 -0.9239 0 0.3827
  [2,24,-0.7071,0,0.7071,-0.9239,0,0.3827],
// 2 24 -0.9239 0 0.3827 -1 0 -0
  [2,24,-0.9239,0,0.3827,-1,0,-0],
// 2 24 -1 0 -0 -0.9239 0 -0.3827
  [2,24,-1,0,-0,-0.9239,0,-0.3827],
// 2 24 -0.9239 0 -0.3827 -0.7071 0 -0.7071
  [2,24,-0.9239,0,-0.3827,-0.7071,0,-0.7071],
// 2 24 -0.7071 0 -0.7071 -0.3827 0 -0.9239
  [2,24,-0.7071,0,-0.7071,-0.3827,0,-0.9239],
// 2 24 -0.3827 0 -0.9239 0 0 -1
  [2,24,-0.3827,0,-0.9239,0,0,-1],
// 2 24 0 0 -1 0.3827 0 -0.9239
  [2,24,0,0,-1,0.3827,0,-0.9239],
// 2 24 0.3827 0 -0.9239 0.7071 0 -0.7071
  [2,24,0.3827,0,-0.9239,0.7071,0,-0.7071],
// 2 24 0.7071 0 -0.7071 0.9239 0 -0.3827
  [2,24,0.7071,0,-0.7071,0.9239,0,-0.3827],
// 2 24 0.9239 0 -0.3827 1 0 0
  [2,24,0.9239,0,-0.3827,1,0,0],
];
module ldraw_lib__4_4edge(step=0, col=false, unit=2/5, alt=false, line=0.2, solid=!$preview)
    makepoly(ldraw_lib__4_4edge(solid), step=step, col=col, unit=unit, alt=alt, line=line, solid=solid);
ldraw_lib__4_4edge(line=0.2);
// file: ../p/4-4disc.scad
use <../lib.scad>
$fa=1; $fs=0.2;
function ldraw_lib__4_4disc(realsolid=false) = [
// 0 Disc 1.0
// 0 Name: 4-4disc.dat
// 0 Author: James Jessiman
// 0 !LDRAW_ORG Primitive UPDATE 2002-02
// 0 !LICENSE Licensed under CC BY 2.0 and CC BY 4.0 : see CAreadme.txt
// 
// 0 BFC CERTIFY CCW
  [0,"BFC","CERTIFY"],
  [0,"BFC","CCW"],
// 
// 0 !HISTORY 1998-12-15 [PTadmin] Official Update 1998-10
// 0 !HISTORY 2002-03-23 [sbliss] Added BFC statement
// 0 !HISTORY 2002-04-25 [PTadmin] Official Update 2002-02
// 0 !HISTORY 2007-06-24 [PTadmin] Header formatted for Contributor Agreement
// 0 !HISTORY 2008-07-01 [PTadmin] Official Update 2008-01
// 
// 
// 3 16 0 0 0 1 0 0 0.9239 0 0.3827
  [3,16,0,0,0,1,0,0,0.9239,0,0.3827],
// 3 16 0 0 0 0.9239 0 0.3827 0.7071 0 0.7071
  [3,16,0,0,0,0.9239,0,0.3827,0.7071,0,0.7071],
// 3 16 0 0 0 0.7071 0 0.7071 0.3827 0 0.9239
  [3,16,0,0,0,0.7071,0,0.7071,0.3827,0,0.9239],
// 3 16 0 0 0 0.3827 0 0.9239 0 0 1
  [3,16,0,0,0,0.3827,0,0.9239,0,0,1],
// 3 16 0 0 0 0 0 1 -0.3827 0 0.9239
  [3,16,0,0,0,0,0,1,-0.3827,0,0.9239],
// 3 16 0 0 0 -0.3827 0 0.9239 -0.7071 0 0.7071
  [3,16,0,0,0,-0.3827,0,0.9239,-0.7071,0,0.7071],
// 3 16 0 0 0 -0.7071 0 0.7071 -0.9239 0 0.3827
  [3,16,0,0,0,-0.7071,0,0.7071,-0.9239,0,0.3827],
// 3 16 0 0 0 -0.9239 0 0.3827 -1 0 -0
  [3,16,0,0,0,-0.9239,0,0.3827,-1,0,-0],
// 3 16 0 0 0 -1 0 -0 -0.9239 0 -0.3827
  [3,16,0,0,0,-1,0,-0,-0.9239,0,-0.3827],
// 3 16 0 0 0 -0.9239 0 -0.3827 -0.7071 0 -0.7071
  [3,16,0,0,0,-0.9239,0,-0.3827,-0.7071,0,-0.7071],
// 3 16 0 0 0 -0.7071 0 -0.7071 -0.3827 0 -0.9239
  [3,16,0,0,0,-0.7071,0,-0.7071,-0.3827,0,-0.9239],
// 3 16 0 0 0 -0.3827 0 -0.9239 0 0 -1
  [3,16,0,0,0,-0.3827,0,-0.9239,0,0,-1],
// 3 16 0 0 0 0 0 -1 0.3827 0 -0.9239
  [3,16,0,0,0,0,0,-1,0.3827,0,-0.9239],
// 3 16 0 0 0 0.3827 0 -0.9239 0.7071 0 -0.7071
  [3,16,0,0,0,0.3827,0,-0.9239,0.7071,0,-0.7071],
// 3 16 0 0 0 0.7071 0 -0.7071 0.9239 0 -0.3827
  [3,16,0,0,0,0.7071,0,-0.7071,0.9239,0,-0.3827],
// 3 16 0 0 0 0.9239 0 -0.3827 1 0 0
  [3,16,0,0,0,0.9239,0,-0.3827,1,0,0],
// 0
];
module ldraw_lib__4_4disc(step=0, col=false, unit=2/5, alt=false, line=0.2, solid=!$preview)
    makepoly(ldraw_lib__4_4disc(solid), step=step, col=col, unit=unit, alt=alt, line=line, solid=solid);
ldraw_lib__4_4disc(line=0.2);
// file: ../p/4-4cylo.scad
use <../lib.scad>
use <4-4cyli.scad>
use <4-4edge.scad>
$fa=1; $fs=0.2;
function ldraw_lib__4_4cylo(realsolid=false) = [
// 0 Cylinder Open 1.0
// 0 Name: 4-4cylo.dat
// 0 Author: Mark Kennedy [mkennedy]
// 0 !LDRAW_ORG Primitive UPDATE 2010-01
// 0 !LICENSE Licensed under CC BY 2.0 and CC BY 4.0 : see CAreadme.txt
// 
// 0 BFC CERTIFY CCW
  [0,"BFC","CERTIFY"],
  [0,"BFC","CCW"],
// 
// 0 !HISTORY 2010-04-05 [PTadmin] Official Update 2010-01
// 
// 
// 1 16 0 0 0 1 0 0 0 1 0 0 0 1 4-4edge.dat
  [1,16,0,0,0,1,0,0,0,1,0,0,0,1, ldraw_lib__4_4edge(realsolid)],
// 1 16 0 1 0 1 0 0 0 1 0 0 0 1 4-4edge.dat
  [1,16,0,1,0,1,0,0,0,1,0,0,0,1, ldraw_lib__4_4edge(realsolid)],
// 1 16 0 0 0 1 0 0 0 1 0 0 0 1 4-4cyli.dat
  [1,16,0,0,0,1,0,0,0,1,0,0,0,1, ldraw_lib__4_4cyli(realsolid)],
// 0
];
module ldraw_lib__4_4cylo(step=0, col=false, unit=2/5, alt=false, line=0.2, solid=!$preview)
    makepoly(ldraw_lib__4_4cylo(solid), step=step, col=col, unit=unit, alt=alt, line=line, solid=solid);
ldraw_lib__4_4cylo(line=0.2);
// file: ../p/4-4cyli.scad
use <../lib.scad>
$fa=1; $fs=0.2;
function ldraw_lib__4_4cyli(realsolid=false) = [
// 0 Cylinder 1.0
// 0 Name: 4-4cyli.dat
// 0 Author: James Jessiman
// 0 !LDRAW_ORG Primitive UPDATE 2005-01
// 0 !LICENSE Licensed under CC BY 2.0 and CC BY 4.0 : see CAreadme.txt
// 
// 0 BFC CERTIFY CCW
  [0,"BFC","CERTIFY"],
  [0,"BFC","CCW"],
// 
// 0 !HISTORY 1998-12-15 [PTadmin] Official Update 1998-10
// 0 !HISTORY 2002-03-23 [sbliss] Added BFC statement; merged headers from files in distributions LDraw 0.27 and Complete.
// 0 !HISTORY 2002-04-25 [PTadmin] Official Update 2002-02
// 0 !HISTORY 2004-12-14 [guyvivan] BFC CCW
// 0 !HISTORY 2005-12-28 [PTadmin] Official Update 2005-01
// 0 !HISTORY 2007-06-24 [PTadmin] Header formatted for Contributor Agreement
// 0 !HISTORY 2008-07-01 [PTadmin] Official Update 2008-01
// 
// 
// 4 16 1 1 0 0.9239 1 0.3827 0.9239 0 0.3827 1 0 0
  [4,16,1,1,0,0.9239,1,0.3827,0.9239,0,0.3827,1,0,0],
// 5 24 1 0 0 1 1 0 0.9239 0 0.3827 0.9239 0 -0.3827
  [5,24,1,0,0,1,1,0,0.9239,0,0.3827,0.9239,0,-0.3827],
// 4 16 0.9239 1 0.3827 0.7071 1 0.7071 0.7071 0 0.7071 0.9239 0 0.3827
  [4,16,0.9239,1,0.3827,0.7071,1,0.7071,0.7071,0,0.7071,0.9239,0,0.3827],
// 5 24 0.9239 0 0.3827 0.9239 1 0.3827 0.7071 0 0.7071 1 0 0
  [5,24,0.9239,0,0.3827,0.9239,1,0.3827,0.7071,0,0.7071,1,0,0],
// 4 16 0.7071 1 0.7071 0.3827 1 0.9239 0.3827 0 0.9239 0.7071 0 0.7071
  [4,16,0.7071,1,0.7071,0.3827,1,0.9239,0.3827,0,0.9239,0.7071,0,0.7071],
// 5 24 0.7071 0 0.7071 0.7071 1 0.7071 0.3827 0 0.9239 0.9239 0 0.3827
  [5,24,0.7071,0,0.7071,0.7071,1,0.7071,0.3827,0,0.9239,0.9239,0,0.3827],
// 4 16 0.3827 1 0.9239 0 1 1 0 0 1 0.3827 0 0.9239
  [4,16,0.3827,1,0.9239,0,1,1,0,0,1,0.3827,0,0.9239],
// 5 24 0.3827 0 0.9239 0.3827 1 0.9239 0 0 1 0.7071 0 0.7071
  [5,24,0.3827,0,0.9239,0.3827,1,0.9239,0,0,1,0.7071,0,0.7071],
// 4 16 0 1 1 -0.3827 1 0.9239 -0.3827 0 0.9239 0 0 1
  [4,16,0,1,1,-0.3827,1,0.9239,-0.3827,0,0.9239,0,0,1],
// 5 24 0 0 1 0 1 1 -0.3827 0 0.9239 0.3827 0 0.9239
  [5,24,0,0,1,0,1,1,-0.3827,0,0.9239,0.3827,0,0.9239],
// 4 16 -0.3827 1 0.9239 -0.7071 1 0.7071 -0.7071 0 0.7071 -0.3827 0 0.9239
  [4,16,-0.3827,1,0.9239,-0.7071,1,0.7071,-0.7071,0,0.7071,-0.3827,0,0.9239],
// 5 24 -0.3827 0 0.9239 -0.3827 1 0.9239 -0.7071 0 0.7071 0 0 1
  [5,24,-0.3827,0,0.9239,-0.3827,1,0.9239,-0.7071,0,0.7071,0,0,1],
// 4 16 -0.7071 1 0.7071 -0.9239 1 0.3827 -0.9239 0 0.3827 -0.7071 0 0.7071
  [4,16,-0.7071,1,0.7071,-0.9239,1,0.3827,-0.9239,0,0.3827,-0.7071,0,0.7071],
// 5 24 -0.7071 0 0.7071 -0.7071 1 0.7071 -0.9239 0 0.3827 -0.3827 0 0.9239
  [5,24,-0.7071,0,0.7071,-0.7071,1,0.7071,-0.9239,0,0.3827,-0.3827,0,0.9239],
// 4 16 -0.9239 1 0.3827 -1 1 0 -1 0 0 -0.9239 0 0.3827
  [4,16,-0.9239,1,0.3827,-1,1,0,-1,0,0,-0.9239,0,0.3827],
// 5 24 -0.9239 0 0.3827 -0.9239 1 0.3827 -1 0 0 -0.7071 0 0.7071
  [5,24,-0.9239,0,0.3827,-0.9239,1,0.3827,-1,0,0,-0.7071,0,0.7071],
// 4 16 -1 1 0 -0.9239 1 -0.3827 -0.9239 0 -0.3827 -1 0 0
  [4,16,-1,1,0,-0.9239,1,-0.3827,-0.9239,0,-0.3827,-1,0,0],
// 5 24 -1 0 0 -1 1 0 -0.9239 0 -0.3827 -0.9239 0 0.3827
  [5,24,-1,0,0,-1,1,0,-0.9239,0,-0.3827,-0.9239,0,0.3827],
// 4 16 -0.9239 1 -0.3827 -0.7071 1 -0.7071 -0.7071 0 -0.7071 -0.9239 0 -0.3827
  [4,16,-0.9239,1,-0.3827,-0.7071,1,-0.7071,-0.7071,0,-0.7071,-0.9239,0,-0.3827],
// 5 24 -0.9239 0 -0.3827 -0.9239 1 -0.3827 -0.7071 0 -0.7071 -1 0 0
  [5,24,-0.9239,0,-0.3827,-0.9239,1,-0.3827,-0.7071,0,-0.7071,-1,0,0],
// 4 16 -0.7071 1 -0.7071 -0.3827 1 -0.9239 -0.3827 0 -0.9239 -0.7071 0 -0.7071
  [4,16,-0.7071,1,-0.7071,-0.3827,1,-0.9239,-0.3827,0,-0.9239,-0.7071,0,-0.7071],
// 5 24 -0.7071 0 -0.7071 -0.7071 1 -0.7071 -0.3827 0 -0.9239 -0.9239 0 -0.3827
  [5,24,-0.7071,0,-0.7071,-0.7071,1,-0.7071,-0.3827,0,-0.9239,-0.9239,0,-0.3827],
// 4 16 -0.3827 1 -0.9239 0 1 -1 0 0 -1 -0.3827 0 -0.9239
  [4,16,-0.3827,1,-0.9239,0,1,-1,0,0,-1,-0.3827,0,-0.9239],
// 5 24 -0.3827 0 -0.9239 -0.3827 1 -0.9239 0 0 -1 -0.7071 0 -0.7071
  [5,24,-0.3827,0,-0.9239,-0.3827,1,-0.9239,0,0,-1,-0.7071,0,-0.7071],
// 4 16 0 1 -1 0.3827 1 -0.9239 0.3827 0 -0.9239 0 0 -1
  [4,16,0,1,-1,0.3827,1,-0.9239,0.3827,0,-0.9239,0,0,-1],
// 5 24 0 0 -1 0 1 -1 0.3827 0 -0.9239 -0.3827 0 -0.9239
  [5,24,0,0,-1,0,1,-1,0.3827,0,-0.9239,-0.3827,0,-0.9239],
// 4 16 0.3827 1 -0.9239 0.7071 1 -0.7071 0.7071 0 -0.7071 0.3827 0 -0.9239
  [4,16,0.3827,1,-0.9239,0.7071,1,-0.7071,0.7071,0,-0.7071,0.3827,0,-0.9239],
// 5 24 0.3827 0 -0.9239 0.3827 1 -0.9239 0.7071 0 -0.7071 0 0 -1
  [5,24,0.3827,0,-0.9239,0.3827,1,-0.9239,0.7071,0,-0.7071,0,0,-1],
// 4 16 0.7071 1 -0.7071 0.9239 1 -0.3827 0.9239 0 -0.3827 0.7071 0 -0.7071
  [4,16,0.7071,1,-0.7071,0.9239,1,-0.3827,0.9239,0,-0.3827,0.7071,0,-0.7071],
// 5 24 0.7071 0 -0.7071 0.7071 1 -0.7071 0.9239 0 -0.3827 0.3827 0 -0.9239
  [5,24,0.7071,0,-0.7071,0.7071,1,-0.7071,0.9239,0,-0.3827,0.3827,0,-0.9239],
// 4 16 0.9239 1 -0.3827 1 1 0 1 0 0 0.9239 0 -0.3827
  [4,16,0.9239,1,-0.3827,1,1,0,1,0,0,0.9239,0,-0.3827],
// 5 24 0.9239 0 -0.3827 0.9239 1 -0.3827 1 0 0 0.7071 0 -0.7071
  [5,24,0.9239,0,-0.3827,0.9239,1,-0.3827,1,0,0,0.7071,0,-0.7071],
// 0
];
module ldraw_lib__4_4cyli(step=0, col=false, unit=2/5, alt=false, line=0.2, solid=!$preview)
    makepoly(ldraw_lib__4_4cyli(solid), step=step, col=col, unit=unit, alt=alt, line=line, solid=solid);
ldraw_lib__4_4cyli(line=0.2);
// file: 3004.scad
use <../lib.scad>
use <s/3004s01.scad>
$fa=1; $fs=0.2;
function ldraw_lib__3004(realsolid=false) = [
// 0 Brick  1 x  2
// 0 Name: 3004.dat
// 0 Author: James Jessiman
// 0 !LDRAW_ORG Part UPDATE 2022-05
// 0 !LICENSE Licensed under CC BY 2.0 and CC BY 4.0 : see CAreadme.txt
// 
// 0 BFC CERTIFY CCW
  [0,"BFC","CERTIFY"],
  [0,"BFC","CCW"],
// 
// 0 !HISTORY 2001-10-26 [PTadmin] Official Update 2001-01
// 0 !HISTORY 2002-05-07 {unknown} BFC Certification
// 0 !HISTORY 2002-06-11 [PTadmin] Official Update 2002-03
// 0 !HISTORY 2007-05-07 [PTadmin] Header formatted for Contributor Agreement
// 0 !HISTORY 2008-07-01 [PTadmin] Official Update 2008-01
// 0 !HISTORY 2022-08-04 [MagFors] Using subfile
// 0 !HISTORY 2022-09-15 [PTadmin] Official Update 2022-05
// 
// 
// 1 16 0 0 0 1 0 0 0 1 0 0 0 1 s\3004s01.dat
  [1,16,0,0,0,1,0,0,0,1,0,0,0,1, ldraw_lib__s__3004s01(realsolid)],
// 4 16 -20 24 -10 20 24 -10 20 0 -10 -20 0 -10
  [4,16,-20,24,-10,20,24,-10,20,0,-10,-20,0,-10],
];
module ldraw_lib__3004(step=0, col=false, unit=2/5, alt=false, line=0.2, solid=!$preview)
    makepoly(ldraw_lib__3004(solid), step=step, col=col, unit=unit, alt=alt, line=line, solid=solid);
ldraw_lib__3004(line=0.2);
// file: 30527k02.scad
use <../lib.scad>
use <../p/4-4cyli.scad>
use <../p/4-4cylo.scad>
use <../p/4-4disc.scad>
use <../p/4-4edge.scad>
use <../p/4-4ring1.scad>
use <../p/4-8sphe.scad>
$fa=1; $fs=0.2;
function ldraw_lib__30527k02(realsolid=false) = [
// 0 ~Hose Flexible 12L Segment
// 0 Name: 30527k02.dat
// 0 Author: Steve Bliss [sbliss]
// 0 !LDRAW_ORG Part Flexible_Section UPDATE 2020-03
// 0 !LICENSE Licensed under CC BY 2.0 and CC BY 4.0 : see CAreadme.txt
// 
// 0 !HELP This file is one segment of the rubber 'hose'. The segment is
// 0 !HELP positioned with the center on the spherical 'cap', for smoother
// 0 !HELP flexing of hose.
// 
// 0 BFC CERTIFY CW
  [0,"BFC","CERTIFY"],
  [0,"BFC","CW"],
// 
// 0 !HISTORY 2004-03-02 [PTadmin] Official Update 2004-01
// 0 !HISTORY 2007-12-30 [PTadmin] Header formatted for Contributor Agreement
// 0 !HISTORY 2008-07-01 [PTadmin] Official Update 2008-01
// 0 !HISTORY 2018-04-02 [PTadmin] Renamed from 758
// 0 !HISTORY 2018-04-24 [MMR1988] Used cylo primitive, Updated ring primitive
// 0 !HISTORY 2020-12-29 [PTadmin] Official Update 2020-03
// 
// 
// 1 16 0 2.2710 0 4 0 0 0 1 0 0 0 4 4-4edge.dat
  [1,16,0,2.2710,0,4,0,0,0,1,0,0,0,4, ldraw_lib__4_4edge(realsolid)],
// 1 16 0 5.1613 0 -4 0 0 0 -1 0 0 0 4 4-4edge.dat
  [1,16,0,5.1613,0,-4,0,0,0,-1,0,0,0,4, ldraw_lib__4_4edge(realsolid)],
// 
// 1 16 0 2.2710 0 4 0 0 0 1 0 0 0 4 4-4ring1.dat
  [1,16,0,2.2710,0,4,0,0,0,1,0,0,0,4, ldraw_lib__4_4ring1(realsolid)],
// 1 16 0 2.2710 0 8 0 0 0 2.8903 0 0 0 8 4-4cylo.dat
  [1,16,0,2.2710,0,8,0,0,0,2.8903,0,0,0,8, ldraw_lib__4_4cylo(realsolid)],
// 1 16 0 5.1613 0 -8 0 0 0 -1 0 0 0 8 4-4disc.dat
  [1,16,0,5.1613,0,-8,0,0,0,-1,0,0,0,8, ldraw_lib__4_4disc(realsolid)],
// 
// 1 16 0 0 0 4 0 0 0 2.2710 0 0 0 4 4-4cyli.dat
  [1,16,0,0,0,4,0,0,0,2.2710,0,0,0,4, ldraw_lib__4_4cyli(realsolid)],
// 1 16 0 0 0 -4 0 0 0 -4 0 0 0 4 4-8sphe.dat
  [1,16,0,0,0,-4,0,0,0,-4,0,0,0,4, ldraw_lib__4_8sphe(realsolid)],
];
module ldraw_lib__30527k02(step=0, col=false, unit=2/5, alt=false, line=0.2, solid=!$preview)
    makepoly(ldraw_lib__30527k02(solid), step=step, col=col, unit=unit, alt=alt, line=line, solid=solid);
ldraw_lib__30527k02(line=0.2);
// main file
use <../lib.scad>
use <30527k02.scad>
$fa=1; $fs=0.2;
function ldraw_lib__758(realsolid=false) = [
// 0 ~Moved to 30527k02
// 0 Name: 758.dat
// 0 Author: [PTadmin]
// 0 !LDRAW_ORG Part UPDATE 2020-03
// 0 !LICENSE Licensed under CC BY 4.0 : see CAreadme.txt
// 
// 0 BFC CERTIFY CCW
  [0,"BFC","CERTIFY"],
  [0,"BFC","CCW"],
// 
// 0 !HISTORY 2020-12-29 [PTadmin] Official Update 2020-03
// 
// 
// 0 // ~Hose Flexible 12L Segment
// 1 16 0 0 0 1 0 0 0 1 0 0 0 1 30527k02.dat
  [1,16,0,0,0,1,0,0,0,1,0,0,0,1, ldraw_lib__30527k02(realsolid)],
];
module ldraw_lib__758(step=0, col=false, unit=2/5, alt=false, line=0.2, solid=!$preview)
    makepoly(ldraw_lib__758(solid), step=step, col=col, unit=unit, alt=alt, line=line, solid=solid);
ldraw_lib__758(line=0.2);
